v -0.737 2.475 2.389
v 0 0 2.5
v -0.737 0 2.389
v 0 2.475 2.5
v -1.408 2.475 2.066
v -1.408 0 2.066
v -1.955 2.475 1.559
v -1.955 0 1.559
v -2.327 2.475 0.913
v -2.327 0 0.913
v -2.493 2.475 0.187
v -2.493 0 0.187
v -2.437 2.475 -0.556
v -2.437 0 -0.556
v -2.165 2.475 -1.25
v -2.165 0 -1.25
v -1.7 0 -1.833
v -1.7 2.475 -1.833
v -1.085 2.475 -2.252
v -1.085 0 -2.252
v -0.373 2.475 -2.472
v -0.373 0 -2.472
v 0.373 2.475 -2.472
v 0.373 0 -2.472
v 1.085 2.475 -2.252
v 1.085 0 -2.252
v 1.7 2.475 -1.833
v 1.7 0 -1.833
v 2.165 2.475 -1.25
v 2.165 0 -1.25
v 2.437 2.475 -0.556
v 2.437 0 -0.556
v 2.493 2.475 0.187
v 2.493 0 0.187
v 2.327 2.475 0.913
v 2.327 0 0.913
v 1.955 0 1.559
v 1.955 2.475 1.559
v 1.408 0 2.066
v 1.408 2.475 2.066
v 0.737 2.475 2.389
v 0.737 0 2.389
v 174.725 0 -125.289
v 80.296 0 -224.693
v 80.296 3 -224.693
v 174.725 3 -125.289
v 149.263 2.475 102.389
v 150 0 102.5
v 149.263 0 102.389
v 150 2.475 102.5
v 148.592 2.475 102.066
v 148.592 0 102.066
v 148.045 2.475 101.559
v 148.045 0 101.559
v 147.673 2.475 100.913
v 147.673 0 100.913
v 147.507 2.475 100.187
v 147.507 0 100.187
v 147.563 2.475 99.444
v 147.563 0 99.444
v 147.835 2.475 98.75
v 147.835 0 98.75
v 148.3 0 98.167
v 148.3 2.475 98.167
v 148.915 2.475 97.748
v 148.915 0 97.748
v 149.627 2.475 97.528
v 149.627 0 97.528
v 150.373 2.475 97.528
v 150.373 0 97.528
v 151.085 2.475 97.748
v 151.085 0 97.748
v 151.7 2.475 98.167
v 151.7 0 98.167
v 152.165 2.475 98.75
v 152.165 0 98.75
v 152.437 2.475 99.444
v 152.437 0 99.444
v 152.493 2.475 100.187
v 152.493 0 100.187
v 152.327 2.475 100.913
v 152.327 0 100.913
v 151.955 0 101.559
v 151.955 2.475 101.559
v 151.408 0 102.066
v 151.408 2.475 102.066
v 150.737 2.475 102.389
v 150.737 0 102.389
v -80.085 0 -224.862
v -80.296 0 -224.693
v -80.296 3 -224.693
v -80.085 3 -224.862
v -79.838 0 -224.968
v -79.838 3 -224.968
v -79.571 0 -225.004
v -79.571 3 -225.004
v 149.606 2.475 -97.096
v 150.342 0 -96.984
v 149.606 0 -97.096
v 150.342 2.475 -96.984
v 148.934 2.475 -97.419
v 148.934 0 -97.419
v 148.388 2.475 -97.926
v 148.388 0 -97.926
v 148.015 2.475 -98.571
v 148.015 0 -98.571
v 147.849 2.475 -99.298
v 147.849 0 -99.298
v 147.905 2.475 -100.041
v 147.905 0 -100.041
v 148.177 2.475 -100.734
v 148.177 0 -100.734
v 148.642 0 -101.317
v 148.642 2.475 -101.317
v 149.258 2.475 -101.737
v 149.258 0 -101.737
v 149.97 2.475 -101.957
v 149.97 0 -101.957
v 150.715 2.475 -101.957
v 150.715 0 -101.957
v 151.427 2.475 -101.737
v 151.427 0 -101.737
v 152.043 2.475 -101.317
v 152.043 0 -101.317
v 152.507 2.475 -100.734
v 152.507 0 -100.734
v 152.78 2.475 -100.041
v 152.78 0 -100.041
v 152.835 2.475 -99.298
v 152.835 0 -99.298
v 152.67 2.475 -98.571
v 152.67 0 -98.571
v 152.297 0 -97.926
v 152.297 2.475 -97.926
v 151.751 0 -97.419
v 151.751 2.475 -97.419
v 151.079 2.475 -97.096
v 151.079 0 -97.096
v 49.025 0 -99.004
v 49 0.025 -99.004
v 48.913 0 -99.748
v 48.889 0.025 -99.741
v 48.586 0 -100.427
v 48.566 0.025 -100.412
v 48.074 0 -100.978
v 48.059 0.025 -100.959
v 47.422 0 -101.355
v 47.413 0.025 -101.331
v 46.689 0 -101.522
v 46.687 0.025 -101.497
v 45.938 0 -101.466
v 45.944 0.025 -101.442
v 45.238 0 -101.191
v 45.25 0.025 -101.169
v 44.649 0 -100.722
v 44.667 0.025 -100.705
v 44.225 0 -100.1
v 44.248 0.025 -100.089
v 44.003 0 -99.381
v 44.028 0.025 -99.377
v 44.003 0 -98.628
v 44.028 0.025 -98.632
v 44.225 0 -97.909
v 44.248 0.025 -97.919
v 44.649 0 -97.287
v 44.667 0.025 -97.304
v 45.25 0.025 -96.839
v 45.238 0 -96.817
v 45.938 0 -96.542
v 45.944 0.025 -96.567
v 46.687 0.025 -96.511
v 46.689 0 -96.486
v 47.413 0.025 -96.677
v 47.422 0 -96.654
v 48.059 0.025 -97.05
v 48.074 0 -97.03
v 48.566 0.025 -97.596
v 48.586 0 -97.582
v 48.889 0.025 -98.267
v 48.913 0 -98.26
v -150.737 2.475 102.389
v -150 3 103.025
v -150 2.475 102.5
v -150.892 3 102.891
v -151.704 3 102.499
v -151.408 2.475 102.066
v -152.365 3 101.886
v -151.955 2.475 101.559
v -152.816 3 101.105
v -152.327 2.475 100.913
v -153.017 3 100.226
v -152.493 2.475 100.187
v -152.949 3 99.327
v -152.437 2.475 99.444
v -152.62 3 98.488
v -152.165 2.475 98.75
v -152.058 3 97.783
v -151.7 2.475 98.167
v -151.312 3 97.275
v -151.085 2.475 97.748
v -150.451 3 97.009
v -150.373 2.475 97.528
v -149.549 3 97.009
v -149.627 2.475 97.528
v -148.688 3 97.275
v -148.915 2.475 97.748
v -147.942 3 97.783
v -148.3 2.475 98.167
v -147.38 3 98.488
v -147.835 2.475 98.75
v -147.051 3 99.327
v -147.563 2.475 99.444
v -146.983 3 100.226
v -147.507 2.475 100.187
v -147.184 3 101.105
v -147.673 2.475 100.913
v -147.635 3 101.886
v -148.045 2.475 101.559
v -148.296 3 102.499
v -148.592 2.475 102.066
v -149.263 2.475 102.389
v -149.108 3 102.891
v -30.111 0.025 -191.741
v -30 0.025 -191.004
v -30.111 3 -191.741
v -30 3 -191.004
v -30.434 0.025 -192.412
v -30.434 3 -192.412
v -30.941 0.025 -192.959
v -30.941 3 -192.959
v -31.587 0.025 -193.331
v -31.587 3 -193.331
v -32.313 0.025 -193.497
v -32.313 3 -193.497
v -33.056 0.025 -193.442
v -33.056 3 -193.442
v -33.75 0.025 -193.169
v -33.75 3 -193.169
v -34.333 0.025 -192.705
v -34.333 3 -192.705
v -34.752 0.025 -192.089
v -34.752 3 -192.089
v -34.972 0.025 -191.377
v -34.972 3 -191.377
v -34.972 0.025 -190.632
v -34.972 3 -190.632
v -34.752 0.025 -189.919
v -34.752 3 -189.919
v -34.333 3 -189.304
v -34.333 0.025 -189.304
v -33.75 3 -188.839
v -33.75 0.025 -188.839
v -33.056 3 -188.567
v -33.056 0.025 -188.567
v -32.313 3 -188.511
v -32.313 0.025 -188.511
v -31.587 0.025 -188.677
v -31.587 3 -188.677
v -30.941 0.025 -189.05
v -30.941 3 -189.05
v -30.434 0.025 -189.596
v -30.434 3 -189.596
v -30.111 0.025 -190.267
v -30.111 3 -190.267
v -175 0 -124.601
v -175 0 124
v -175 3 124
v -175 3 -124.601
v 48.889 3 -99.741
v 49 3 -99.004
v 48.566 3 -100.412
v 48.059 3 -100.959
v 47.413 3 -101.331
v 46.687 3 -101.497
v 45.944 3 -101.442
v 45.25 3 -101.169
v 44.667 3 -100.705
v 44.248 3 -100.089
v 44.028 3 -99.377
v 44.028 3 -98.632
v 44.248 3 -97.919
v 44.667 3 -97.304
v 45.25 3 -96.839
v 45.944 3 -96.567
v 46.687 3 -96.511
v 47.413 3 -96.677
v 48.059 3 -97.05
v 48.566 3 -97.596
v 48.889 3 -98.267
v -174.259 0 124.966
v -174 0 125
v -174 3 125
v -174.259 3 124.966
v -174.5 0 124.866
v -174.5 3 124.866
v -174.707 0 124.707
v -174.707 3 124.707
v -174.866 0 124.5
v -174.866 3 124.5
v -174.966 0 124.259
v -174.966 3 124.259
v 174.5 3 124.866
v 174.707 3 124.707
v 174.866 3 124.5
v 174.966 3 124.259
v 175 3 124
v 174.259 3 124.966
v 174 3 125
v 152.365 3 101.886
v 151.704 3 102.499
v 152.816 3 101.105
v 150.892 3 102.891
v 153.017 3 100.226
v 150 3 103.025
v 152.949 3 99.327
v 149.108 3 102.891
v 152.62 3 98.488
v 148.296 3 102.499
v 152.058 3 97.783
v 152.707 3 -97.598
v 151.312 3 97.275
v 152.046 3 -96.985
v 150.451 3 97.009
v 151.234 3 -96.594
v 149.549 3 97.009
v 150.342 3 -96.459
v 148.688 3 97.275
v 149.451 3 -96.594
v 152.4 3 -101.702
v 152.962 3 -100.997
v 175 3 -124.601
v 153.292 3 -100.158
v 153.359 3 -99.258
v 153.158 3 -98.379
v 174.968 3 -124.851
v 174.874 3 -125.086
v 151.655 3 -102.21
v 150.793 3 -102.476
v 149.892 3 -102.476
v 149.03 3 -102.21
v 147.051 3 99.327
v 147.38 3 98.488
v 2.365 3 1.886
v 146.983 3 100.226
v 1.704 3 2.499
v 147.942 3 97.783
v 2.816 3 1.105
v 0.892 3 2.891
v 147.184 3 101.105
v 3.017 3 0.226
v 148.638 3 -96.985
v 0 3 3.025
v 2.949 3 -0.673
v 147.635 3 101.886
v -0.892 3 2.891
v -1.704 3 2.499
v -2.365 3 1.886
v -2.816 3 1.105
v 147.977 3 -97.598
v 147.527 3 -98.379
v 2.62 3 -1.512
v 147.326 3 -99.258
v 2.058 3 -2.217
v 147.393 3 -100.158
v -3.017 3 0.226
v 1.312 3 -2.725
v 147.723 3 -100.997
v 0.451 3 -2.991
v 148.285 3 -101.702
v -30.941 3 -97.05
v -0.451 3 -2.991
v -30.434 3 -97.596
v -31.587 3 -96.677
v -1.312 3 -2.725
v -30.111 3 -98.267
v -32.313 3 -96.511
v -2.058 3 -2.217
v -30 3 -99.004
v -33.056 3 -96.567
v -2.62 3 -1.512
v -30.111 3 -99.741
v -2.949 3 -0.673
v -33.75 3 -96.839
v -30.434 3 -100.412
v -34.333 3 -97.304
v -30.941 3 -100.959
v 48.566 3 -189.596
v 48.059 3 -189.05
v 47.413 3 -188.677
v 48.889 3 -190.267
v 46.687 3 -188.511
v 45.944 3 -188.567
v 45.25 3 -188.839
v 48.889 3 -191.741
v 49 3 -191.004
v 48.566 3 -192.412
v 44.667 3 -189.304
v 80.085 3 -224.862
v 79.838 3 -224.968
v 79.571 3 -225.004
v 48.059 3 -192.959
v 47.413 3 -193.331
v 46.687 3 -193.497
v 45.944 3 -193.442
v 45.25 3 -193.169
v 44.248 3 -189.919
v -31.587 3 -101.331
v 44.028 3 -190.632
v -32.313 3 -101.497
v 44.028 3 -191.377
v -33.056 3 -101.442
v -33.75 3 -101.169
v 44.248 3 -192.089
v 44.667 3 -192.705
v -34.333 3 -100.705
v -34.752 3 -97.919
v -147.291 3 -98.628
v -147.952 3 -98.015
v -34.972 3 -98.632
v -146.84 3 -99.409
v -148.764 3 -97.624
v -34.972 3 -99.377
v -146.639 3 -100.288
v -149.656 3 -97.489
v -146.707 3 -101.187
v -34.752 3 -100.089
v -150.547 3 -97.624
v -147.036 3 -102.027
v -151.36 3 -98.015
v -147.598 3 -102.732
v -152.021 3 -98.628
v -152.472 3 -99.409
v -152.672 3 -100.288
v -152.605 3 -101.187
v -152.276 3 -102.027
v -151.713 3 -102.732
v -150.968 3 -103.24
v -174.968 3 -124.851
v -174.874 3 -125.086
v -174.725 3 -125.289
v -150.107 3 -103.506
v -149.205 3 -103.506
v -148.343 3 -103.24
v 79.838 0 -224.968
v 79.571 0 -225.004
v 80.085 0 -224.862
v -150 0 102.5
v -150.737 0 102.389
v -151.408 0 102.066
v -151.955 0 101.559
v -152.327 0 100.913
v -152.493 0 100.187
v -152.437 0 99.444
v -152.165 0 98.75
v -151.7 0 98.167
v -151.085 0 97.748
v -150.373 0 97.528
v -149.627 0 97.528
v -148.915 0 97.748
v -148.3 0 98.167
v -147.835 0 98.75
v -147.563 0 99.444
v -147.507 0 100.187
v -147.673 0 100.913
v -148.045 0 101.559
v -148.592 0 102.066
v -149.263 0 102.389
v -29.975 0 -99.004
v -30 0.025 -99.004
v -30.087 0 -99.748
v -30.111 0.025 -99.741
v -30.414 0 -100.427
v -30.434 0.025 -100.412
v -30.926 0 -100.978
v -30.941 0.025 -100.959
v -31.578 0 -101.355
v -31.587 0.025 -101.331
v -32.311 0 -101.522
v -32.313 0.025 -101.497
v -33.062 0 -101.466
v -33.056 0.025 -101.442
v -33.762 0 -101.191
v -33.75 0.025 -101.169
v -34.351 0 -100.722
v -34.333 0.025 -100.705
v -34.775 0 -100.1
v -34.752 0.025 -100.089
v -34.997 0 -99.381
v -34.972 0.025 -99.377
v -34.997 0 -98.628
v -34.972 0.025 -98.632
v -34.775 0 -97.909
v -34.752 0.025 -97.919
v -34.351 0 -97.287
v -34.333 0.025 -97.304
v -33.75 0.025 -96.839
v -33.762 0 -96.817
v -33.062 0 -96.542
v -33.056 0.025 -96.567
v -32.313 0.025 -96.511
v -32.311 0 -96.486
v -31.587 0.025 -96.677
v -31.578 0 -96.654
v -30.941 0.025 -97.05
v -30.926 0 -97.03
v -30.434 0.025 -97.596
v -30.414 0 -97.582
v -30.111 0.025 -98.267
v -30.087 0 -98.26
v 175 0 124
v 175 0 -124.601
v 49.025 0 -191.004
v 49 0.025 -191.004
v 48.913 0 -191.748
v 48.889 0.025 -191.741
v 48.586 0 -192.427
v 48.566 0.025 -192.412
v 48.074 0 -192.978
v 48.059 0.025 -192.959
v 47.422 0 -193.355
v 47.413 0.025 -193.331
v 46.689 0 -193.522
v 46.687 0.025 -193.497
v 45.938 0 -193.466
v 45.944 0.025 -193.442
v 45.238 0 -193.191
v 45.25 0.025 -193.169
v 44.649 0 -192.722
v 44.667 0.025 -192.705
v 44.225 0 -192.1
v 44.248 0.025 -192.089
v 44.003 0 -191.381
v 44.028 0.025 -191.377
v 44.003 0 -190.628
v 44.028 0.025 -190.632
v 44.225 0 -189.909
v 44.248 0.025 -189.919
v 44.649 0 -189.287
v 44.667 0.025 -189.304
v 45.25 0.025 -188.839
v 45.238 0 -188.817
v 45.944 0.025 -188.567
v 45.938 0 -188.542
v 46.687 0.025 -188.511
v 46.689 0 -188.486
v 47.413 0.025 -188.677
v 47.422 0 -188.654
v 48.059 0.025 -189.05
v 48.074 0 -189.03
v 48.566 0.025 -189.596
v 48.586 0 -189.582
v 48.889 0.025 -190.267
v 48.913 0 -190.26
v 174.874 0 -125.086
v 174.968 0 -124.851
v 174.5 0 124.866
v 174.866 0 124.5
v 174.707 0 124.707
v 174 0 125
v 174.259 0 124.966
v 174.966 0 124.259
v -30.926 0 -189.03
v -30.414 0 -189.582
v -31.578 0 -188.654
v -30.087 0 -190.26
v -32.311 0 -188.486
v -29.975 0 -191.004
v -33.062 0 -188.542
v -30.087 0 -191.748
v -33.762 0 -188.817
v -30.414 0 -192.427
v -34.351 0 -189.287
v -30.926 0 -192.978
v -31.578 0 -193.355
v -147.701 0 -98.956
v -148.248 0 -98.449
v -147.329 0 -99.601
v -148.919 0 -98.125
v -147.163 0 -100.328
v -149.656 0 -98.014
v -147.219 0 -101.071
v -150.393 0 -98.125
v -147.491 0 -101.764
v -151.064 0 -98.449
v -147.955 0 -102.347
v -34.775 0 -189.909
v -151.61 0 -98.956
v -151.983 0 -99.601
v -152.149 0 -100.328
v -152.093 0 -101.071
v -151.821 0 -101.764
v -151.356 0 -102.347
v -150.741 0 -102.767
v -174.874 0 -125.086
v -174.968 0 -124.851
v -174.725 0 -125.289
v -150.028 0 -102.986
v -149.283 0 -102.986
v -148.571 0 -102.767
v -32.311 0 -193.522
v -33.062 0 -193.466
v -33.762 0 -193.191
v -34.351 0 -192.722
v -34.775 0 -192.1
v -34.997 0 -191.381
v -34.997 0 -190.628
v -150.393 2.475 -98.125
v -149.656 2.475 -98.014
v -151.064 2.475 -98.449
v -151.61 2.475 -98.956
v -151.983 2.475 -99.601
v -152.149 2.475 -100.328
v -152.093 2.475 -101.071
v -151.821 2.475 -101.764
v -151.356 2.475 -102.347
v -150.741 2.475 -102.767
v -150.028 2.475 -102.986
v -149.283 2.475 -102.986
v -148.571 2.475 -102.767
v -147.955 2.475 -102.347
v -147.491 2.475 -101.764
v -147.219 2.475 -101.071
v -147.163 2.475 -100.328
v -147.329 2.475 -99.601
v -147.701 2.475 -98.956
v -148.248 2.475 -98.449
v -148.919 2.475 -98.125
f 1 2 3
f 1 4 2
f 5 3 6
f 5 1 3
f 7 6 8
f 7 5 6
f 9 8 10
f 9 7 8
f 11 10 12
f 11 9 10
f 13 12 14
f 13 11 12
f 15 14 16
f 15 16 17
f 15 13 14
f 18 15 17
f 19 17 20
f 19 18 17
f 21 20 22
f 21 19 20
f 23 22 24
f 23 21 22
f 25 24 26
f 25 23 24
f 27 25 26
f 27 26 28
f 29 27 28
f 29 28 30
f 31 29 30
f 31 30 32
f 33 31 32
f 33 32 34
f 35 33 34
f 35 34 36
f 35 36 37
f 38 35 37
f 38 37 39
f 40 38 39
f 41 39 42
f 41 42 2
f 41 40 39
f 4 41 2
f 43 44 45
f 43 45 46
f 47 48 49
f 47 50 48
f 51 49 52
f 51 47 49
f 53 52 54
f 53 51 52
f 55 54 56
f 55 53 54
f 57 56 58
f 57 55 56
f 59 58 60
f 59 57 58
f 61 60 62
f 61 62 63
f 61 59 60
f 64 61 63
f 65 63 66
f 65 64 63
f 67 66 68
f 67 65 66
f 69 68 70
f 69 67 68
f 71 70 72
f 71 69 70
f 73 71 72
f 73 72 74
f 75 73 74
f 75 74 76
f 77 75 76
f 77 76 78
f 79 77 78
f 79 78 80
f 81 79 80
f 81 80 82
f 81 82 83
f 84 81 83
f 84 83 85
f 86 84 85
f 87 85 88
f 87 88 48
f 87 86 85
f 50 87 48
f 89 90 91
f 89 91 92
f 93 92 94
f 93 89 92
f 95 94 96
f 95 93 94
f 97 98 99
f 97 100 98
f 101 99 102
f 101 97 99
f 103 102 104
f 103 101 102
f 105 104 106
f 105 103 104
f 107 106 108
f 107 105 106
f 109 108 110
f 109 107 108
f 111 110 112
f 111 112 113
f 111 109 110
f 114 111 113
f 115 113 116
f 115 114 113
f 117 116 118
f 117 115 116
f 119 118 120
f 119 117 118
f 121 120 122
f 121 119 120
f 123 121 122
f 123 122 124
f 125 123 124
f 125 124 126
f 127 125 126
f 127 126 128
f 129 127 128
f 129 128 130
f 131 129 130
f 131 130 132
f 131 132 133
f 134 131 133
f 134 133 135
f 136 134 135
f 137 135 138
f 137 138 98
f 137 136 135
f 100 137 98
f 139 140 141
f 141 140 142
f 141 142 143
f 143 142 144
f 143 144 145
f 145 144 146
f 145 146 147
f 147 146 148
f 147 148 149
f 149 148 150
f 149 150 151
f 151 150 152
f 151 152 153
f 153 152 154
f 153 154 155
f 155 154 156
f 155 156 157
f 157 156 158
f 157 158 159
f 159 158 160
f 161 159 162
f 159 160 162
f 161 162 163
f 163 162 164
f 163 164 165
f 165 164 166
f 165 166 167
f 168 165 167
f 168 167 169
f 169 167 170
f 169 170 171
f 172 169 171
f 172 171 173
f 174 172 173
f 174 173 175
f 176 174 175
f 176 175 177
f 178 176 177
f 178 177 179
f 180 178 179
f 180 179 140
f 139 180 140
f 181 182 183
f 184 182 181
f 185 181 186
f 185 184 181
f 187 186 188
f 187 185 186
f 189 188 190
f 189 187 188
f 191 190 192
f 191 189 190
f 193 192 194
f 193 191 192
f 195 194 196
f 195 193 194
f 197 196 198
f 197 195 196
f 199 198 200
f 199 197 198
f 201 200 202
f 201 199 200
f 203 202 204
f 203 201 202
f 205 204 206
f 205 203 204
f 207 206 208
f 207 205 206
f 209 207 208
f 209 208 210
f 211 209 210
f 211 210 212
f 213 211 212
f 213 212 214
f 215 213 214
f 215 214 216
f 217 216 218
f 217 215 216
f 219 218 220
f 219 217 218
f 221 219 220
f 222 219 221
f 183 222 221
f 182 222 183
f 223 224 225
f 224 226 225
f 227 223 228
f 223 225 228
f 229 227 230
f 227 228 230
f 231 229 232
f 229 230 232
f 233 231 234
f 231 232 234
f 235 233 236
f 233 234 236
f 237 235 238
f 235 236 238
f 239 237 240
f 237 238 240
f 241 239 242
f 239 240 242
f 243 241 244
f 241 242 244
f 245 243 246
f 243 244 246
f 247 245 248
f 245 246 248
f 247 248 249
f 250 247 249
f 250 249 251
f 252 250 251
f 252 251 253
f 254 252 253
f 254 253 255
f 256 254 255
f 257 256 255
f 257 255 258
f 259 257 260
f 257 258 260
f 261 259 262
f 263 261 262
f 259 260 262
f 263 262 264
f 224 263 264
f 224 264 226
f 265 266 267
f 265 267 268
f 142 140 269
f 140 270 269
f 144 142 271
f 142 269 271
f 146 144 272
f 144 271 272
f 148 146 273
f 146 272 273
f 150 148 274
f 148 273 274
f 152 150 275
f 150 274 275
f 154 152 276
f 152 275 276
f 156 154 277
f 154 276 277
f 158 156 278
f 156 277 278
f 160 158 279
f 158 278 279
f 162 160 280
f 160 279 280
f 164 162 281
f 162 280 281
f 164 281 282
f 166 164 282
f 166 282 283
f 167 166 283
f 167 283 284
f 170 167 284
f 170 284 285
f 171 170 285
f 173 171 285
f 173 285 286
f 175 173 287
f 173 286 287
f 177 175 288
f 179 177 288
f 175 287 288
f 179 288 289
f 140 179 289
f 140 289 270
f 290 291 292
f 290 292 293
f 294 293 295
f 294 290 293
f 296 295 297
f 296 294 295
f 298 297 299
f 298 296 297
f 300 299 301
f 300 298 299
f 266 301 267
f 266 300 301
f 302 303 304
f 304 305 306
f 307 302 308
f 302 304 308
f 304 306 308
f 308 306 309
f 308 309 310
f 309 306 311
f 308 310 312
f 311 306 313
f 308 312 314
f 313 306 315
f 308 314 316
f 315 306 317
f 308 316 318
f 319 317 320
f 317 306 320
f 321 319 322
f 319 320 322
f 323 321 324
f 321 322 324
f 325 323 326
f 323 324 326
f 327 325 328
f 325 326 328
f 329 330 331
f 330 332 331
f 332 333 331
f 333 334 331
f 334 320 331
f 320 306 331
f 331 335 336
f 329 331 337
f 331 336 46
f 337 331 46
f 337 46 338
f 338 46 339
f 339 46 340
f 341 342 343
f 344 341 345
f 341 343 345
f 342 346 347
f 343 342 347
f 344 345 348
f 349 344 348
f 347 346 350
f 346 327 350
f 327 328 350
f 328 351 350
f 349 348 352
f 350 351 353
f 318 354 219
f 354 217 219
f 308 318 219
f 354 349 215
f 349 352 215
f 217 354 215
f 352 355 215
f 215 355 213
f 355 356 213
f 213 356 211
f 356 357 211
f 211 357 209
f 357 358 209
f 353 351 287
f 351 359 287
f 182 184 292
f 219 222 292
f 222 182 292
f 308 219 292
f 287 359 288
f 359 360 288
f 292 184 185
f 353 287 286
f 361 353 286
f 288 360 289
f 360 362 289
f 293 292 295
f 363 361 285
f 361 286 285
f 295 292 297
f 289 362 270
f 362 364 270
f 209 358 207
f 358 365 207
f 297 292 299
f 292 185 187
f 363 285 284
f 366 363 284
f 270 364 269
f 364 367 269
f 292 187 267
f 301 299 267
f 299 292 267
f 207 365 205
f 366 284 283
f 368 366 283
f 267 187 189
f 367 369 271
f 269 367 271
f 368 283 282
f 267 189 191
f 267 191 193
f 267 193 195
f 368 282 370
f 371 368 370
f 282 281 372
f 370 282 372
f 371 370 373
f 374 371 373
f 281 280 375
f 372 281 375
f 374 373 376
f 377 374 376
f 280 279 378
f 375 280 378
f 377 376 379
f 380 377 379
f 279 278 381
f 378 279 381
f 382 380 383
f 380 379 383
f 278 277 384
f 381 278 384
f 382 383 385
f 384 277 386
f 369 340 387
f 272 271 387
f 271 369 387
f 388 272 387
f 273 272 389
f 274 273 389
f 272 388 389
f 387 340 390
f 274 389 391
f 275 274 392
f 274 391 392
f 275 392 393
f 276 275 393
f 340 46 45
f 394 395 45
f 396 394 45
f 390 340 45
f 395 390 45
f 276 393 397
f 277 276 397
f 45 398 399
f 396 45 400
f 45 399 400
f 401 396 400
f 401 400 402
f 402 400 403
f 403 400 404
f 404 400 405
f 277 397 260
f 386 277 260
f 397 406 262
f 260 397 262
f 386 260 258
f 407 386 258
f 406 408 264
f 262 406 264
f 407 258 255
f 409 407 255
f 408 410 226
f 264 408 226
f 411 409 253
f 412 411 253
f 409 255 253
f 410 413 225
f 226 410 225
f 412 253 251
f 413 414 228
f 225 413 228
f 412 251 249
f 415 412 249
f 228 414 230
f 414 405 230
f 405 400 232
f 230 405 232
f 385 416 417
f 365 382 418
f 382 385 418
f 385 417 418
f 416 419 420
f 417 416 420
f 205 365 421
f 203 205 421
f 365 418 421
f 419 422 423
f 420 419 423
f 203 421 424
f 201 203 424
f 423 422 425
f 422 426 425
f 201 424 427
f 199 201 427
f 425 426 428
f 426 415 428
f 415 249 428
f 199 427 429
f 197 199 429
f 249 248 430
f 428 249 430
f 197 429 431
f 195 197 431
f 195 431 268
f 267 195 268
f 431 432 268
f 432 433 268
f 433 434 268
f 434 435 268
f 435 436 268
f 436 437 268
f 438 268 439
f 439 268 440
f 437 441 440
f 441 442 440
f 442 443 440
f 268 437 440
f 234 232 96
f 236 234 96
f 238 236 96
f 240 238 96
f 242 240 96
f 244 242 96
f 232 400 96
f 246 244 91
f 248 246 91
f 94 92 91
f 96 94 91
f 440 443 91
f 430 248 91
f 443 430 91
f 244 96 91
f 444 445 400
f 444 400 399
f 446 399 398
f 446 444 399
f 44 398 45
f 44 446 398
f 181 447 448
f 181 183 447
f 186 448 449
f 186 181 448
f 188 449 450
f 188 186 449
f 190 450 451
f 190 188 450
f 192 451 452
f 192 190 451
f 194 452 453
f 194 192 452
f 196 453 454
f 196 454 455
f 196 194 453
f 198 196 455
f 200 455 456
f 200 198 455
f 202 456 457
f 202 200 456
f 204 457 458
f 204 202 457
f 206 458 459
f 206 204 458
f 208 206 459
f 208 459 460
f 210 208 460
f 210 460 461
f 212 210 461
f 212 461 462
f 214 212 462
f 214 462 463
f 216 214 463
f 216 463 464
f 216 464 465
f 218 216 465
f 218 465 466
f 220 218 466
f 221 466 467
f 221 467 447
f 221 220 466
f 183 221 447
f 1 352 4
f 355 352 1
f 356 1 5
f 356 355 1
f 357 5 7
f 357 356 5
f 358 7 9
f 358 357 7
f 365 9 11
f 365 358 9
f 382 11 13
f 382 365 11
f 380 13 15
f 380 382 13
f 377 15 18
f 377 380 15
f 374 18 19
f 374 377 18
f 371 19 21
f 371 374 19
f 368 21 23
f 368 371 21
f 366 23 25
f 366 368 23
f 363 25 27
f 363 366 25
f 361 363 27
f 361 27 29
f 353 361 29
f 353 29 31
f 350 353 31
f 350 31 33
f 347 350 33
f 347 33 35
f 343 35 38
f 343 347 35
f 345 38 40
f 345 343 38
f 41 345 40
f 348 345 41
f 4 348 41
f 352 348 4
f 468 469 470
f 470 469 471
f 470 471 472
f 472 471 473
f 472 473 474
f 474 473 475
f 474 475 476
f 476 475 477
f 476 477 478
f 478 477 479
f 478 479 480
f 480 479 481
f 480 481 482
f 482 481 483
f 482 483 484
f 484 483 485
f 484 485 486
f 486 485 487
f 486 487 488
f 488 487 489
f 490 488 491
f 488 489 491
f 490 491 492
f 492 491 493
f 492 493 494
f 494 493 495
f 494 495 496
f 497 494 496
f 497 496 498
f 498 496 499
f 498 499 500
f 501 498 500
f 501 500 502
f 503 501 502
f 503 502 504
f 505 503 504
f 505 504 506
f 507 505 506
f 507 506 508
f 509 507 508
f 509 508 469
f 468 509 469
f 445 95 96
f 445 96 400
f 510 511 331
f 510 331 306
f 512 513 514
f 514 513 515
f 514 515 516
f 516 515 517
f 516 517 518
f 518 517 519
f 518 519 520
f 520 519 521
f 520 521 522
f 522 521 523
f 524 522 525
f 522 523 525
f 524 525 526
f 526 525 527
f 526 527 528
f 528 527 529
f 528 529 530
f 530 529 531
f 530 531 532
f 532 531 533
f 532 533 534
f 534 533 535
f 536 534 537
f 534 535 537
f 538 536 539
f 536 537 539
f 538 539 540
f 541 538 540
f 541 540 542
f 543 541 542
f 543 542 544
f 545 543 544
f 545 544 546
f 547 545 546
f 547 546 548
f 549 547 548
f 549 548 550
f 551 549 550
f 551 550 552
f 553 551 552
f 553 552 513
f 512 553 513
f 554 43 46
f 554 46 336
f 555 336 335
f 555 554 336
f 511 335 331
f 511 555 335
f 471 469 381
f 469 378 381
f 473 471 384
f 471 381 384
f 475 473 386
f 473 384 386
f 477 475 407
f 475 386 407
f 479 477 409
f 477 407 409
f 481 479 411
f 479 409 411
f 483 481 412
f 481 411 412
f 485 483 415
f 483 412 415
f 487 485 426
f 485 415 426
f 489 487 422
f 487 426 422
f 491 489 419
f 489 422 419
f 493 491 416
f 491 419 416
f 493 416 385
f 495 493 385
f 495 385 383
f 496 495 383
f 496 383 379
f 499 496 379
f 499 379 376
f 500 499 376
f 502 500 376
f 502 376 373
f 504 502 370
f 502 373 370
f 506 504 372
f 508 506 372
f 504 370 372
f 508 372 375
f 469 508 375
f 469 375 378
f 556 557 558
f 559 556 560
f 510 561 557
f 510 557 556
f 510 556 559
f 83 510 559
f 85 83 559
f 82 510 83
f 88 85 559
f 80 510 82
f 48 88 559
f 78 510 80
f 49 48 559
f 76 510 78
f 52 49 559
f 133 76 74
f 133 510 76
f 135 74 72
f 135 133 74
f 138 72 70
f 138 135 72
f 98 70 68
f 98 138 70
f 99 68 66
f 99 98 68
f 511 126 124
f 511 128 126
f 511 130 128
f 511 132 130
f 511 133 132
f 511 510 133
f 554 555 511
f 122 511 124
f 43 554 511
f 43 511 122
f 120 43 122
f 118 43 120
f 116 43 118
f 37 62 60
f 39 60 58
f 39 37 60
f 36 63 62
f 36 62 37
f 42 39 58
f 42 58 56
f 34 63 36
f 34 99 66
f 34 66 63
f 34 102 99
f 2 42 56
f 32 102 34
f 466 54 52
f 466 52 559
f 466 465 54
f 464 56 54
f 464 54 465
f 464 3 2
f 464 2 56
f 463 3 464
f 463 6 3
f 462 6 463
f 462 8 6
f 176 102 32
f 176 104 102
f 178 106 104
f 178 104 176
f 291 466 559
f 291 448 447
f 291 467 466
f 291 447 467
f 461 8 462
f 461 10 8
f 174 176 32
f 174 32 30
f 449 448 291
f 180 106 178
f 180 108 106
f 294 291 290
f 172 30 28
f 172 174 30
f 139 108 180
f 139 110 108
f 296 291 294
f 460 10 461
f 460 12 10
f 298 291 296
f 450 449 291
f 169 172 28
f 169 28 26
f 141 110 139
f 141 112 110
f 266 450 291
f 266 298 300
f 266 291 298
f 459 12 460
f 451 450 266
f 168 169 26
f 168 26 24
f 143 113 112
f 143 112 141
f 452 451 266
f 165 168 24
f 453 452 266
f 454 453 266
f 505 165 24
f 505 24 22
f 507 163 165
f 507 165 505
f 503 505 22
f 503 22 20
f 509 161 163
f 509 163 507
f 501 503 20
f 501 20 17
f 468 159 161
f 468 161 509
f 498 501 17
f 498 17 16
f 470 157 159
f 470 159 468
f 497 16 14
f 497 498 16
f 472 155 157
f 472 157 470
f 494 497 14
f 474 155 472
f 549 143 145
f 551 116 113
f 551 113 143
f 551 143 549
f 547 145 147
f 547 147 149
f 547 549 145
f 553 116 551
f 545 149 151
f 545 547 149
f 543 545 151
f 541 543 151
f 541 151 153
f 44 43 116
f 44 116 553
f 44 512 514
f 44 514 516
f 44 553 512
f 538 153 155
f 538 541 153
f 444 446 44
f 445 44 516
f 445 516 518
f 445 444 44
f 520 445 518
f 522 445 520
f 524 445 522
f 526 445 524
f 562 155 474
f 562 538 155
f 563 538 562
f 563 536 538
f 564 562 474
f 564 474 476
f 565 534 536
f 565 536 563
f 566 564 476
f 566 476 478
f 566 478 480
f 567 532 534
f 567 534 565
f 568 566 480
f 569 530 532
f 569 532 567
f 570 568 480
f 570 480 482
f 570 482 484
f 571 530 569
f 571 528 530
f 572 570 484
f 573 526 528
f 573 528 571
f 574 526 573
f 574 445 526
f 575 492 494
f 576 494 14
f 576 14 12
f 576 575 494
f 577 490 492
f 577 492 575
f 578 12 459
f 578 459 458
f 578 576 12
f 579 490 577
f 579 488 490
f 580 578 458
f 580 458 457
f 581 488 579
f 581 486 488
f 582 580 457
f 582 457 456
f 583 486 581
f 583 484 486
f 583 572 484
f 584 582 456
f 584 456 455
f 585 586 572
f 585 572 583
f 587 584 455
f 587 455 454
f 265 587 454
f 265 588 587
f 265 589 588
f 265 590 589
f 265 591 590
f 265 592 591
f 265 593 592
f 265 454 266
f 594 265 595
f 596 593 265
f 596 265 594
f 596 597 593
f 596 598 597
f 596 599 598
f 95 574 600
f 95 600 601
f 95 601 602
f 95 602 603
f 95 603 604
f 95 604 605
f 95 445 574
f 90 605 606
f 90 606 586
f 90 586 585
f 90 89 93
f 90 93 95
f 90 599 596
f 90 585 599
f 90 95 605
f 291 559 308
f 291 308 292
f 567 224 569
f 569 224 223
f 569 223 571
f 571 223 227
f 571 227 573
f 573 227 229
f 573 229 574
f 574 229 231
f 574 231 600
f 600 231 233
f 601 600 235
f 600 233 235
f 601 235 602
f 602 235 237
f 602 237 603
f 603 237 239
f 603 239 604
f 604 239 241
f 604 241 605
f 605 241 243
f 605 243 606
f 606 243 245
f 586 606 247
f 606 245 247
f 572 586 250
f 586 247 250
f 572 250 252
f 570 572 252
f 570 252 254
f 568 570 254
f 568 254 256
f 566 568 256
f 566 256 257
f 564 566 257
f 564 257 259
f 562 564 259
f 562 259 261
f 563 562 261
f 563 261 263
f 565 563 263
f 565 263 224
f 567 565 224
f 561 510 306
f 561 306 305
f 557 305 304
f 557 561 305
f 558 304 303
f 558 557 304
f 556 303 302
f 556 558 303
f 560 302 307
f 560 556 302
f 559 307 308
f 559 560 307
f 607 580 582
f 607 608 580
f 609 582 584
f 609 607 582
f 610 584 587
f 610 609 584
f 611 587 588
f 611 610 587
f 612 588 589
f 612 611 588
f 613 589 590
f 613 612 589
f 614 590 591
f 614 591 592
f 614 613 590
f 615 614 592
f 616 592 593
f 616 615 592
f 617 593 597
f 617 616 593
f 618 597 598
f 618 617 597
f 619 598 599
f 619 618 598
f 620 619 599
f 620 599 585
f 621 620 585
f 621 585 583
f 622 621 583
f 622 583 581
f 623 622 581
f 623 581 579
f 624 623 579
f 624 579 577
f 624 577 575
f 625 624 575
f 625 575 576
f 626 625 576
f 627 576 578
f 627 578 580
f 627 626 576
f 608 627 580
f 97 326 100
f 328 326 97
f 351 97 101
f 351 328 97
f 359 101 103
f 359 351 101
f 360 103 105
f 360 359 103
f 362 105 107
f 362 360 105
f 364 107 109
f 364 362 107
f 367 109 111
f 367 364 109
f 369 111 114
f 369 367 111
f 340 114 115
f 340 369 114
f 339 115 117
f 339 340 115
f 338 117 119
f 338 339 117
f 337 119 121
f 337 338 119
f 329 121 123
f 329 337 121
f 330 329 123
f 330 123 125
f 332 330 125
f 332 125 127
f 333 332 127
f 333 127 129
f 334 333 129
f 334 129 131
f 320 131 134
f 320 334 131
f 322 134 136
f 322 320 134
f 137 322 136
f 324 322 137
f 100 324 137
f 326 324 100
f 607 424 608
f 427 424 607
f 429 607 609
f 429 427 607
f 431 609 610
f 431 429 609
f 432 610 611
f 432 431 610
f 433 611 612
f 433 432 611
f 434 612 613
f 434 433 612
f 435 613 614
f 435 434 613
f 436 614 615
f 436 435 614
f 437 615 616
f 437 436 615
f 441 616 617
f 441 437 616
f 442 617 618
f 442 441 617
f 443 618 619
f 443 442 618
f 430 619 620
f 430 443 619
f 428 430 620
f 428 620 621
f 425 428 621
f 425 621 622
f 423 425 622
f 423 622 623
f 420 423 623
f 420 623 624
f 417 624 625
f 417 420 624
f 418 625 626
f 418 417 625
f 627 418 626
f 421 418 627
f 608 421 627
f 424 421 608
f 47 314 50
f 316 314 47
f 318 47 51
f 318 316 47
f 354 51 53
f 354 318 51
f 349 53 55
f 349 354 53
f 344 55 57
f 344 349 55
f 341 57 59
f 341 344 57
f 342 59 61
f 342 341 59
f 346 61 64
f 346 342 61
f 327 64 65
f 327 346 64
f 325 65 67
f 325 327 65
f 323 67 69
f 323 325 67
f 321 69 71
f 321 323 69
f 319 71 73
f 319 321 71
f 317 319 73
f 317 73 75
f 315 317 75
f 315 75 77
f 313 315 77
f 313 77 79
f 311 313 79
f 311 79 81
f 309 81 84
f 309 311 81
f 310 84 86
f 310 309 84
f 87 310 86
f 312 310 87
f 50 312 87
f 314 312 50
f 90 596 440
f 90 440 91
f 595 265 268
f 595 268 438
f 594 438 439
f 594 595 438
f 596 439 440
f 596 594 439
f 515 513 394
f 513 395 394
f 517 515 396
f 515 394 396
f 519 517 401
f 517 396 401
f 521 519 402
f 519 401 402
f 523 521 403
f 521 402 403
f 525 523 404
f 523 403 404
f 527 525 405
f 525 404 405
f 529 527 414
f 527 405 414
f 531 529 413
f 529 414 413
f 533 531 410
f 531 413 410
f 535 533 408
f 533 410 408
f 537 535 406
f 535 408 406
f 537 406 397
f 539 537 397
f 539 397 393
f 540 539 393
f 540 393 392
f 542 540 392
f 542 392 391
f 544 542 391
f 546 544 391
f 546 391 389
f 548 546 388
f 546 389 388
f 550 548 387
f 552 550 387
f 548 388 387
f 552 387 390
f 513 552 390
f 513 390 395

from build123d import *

# Parameters (mm, degrees)
PLATE_EXTRUDE_1_DEPTH             = 3
M6_TAPPED_HOLE2_AT_2_COUNT        = 2
M6_TAPPED_HOLE2_AT_2_PITCH        = 300
M6_TAPPED_HOLE2_AT_3_COUNT        = 2
M6_TAPPED_HOLE2_AT_3_PITCH        = 180.277563773
M6_TAPPED_HOLE2_AT_4_COUNT        = 2
M6_TAPPED_HOLE2_AT_4_PITCH        = 200.51462203
M6_TAPPED_HOLE2_AT_5_COUNT        = 2
M6_TAPPED_HOLE2_AT_5_PITCH        = 360.55459645
TAP_DRILL_FOR_M6_TAP1_D           = 5
TAP_DRILL_FOR_M6_TAP1_DEPTH       = 10
TAP_DRILL_FOR_M6_TAP1_CSINK_D     = 5.05
TAP_DRILL_FOR_M6_TAP1_CSINK_ANGLE = 90
TAP_DRILL_FOR_M6_TAP1_TIP         = 1.502151548


with BuildPart() as part:
    # Plate Template → Plate Extrude 1 (new body)
    with BuildSketch(Plane(origin=(0, 0, 0), x_dir=(1, 0, 0), z_dir=(0, 1, 0))):
        with BuildLine():
            Line((-79.570676183, 225.004191897), (79.570676183, 225.004191897))
            ThreePointArc((79.570676183, 225.004191897), (79.965179487, 224.92308642), (80.295690033, 224.692926184))
            Line((80.295690033, 224.692926184), (174.72501385, 125.289471239))
            ThreePointArc((174.72501385, 125.289471239), (174.928712509, 124.971537539), (175, 124.600736953))
            Line((175, 124.600736953), (175, -124))
            ThreePointArc((175, -124), (174.707106781, -124.707106781), (174, -125))
            Line((174, -125), (-174, -125))
            ThreePointArc((-174, -125), (-174.707106781, -124.707106781), (-175, -124))
            Line((-175, -124), (-175, 124.600736953))
            ThreePointArc((-175, 124.600736953), (-174.928712509, 124.971537539), (-174.72501385, 125.289471239))
            Line((-174.72501385, 125.289471239), (-80.295690033, 224.692926184))
            ThreePointArc((-80.295690033, 224.692926184), (-79.965179487, 224.92308642), (-79.570676183, 225.004191897))
        make_face()
    extrude(amount=PLATE_EXTRUDE_1_DEPTH)

    # Sketch3 → M6 Tapped Hole2 (revolve, cut)
    with BuildSketch(Plane(origin=(-150, 3, 100), x_dir=(0, 0, 1), z_dir=(1, 0, 0))):
        Polygon((0, 0), (0, 3), (2.5, 3), (2.5, 0.525), (3.025, 0), align=None)
    m6_tapped_hole2 = revolve(axis=Axis((-150, 9.35, 100), (0, -1, 0)), mode=Mode.SUBTRACT)

    # M6 Tapped Hole2 at 2: M6 Tapped Hole2 ×2
    with Locations(*[(i * M6_TAPPED_HOLE2_AT_2_PITCH, 0, 0) for i in range(1, M6_TAPPED_HOLE2_AT_2_COUNT)]):
        add(m6_tapped_hole2, mode=Mode.SUBTRACT)

    # M6 Tapped Hole2 at 3: M6 Tapped Hole2 ×2
    with Locations(*[Vector(0.8320502943378437, 0, -0.554700196225229) * (i * M6_TAPPED_HOLE2_AT_3_PITCH) for i in range(1, M6_TAPPED_HOLE2_AT_3_COUNT)]):
        add(m6_tapped_hole2, mode=Mode.SUBTRACT)

    # M6 Tapped Hole2 at 4: M6 Tapped Hole2 ×2
    with Locations(*[Vector(0.0017163887650713508, 0, -0.9999985270037187) * (i * M6_TAPPED_HOLE2_AT_4_PITCH) for i in range(1, M6_TAPPED_HOLE2_AT_4_COUNT)]):
        add(m6_tapped_hole2, mode=Mode.SUBTRACT)

    # M6 Tapped Hole2 at 5: M6 Tapped Hole2 ×2
    with Locations(*[Vector(0.8330011499156382, 0, -0.5532712573767269) * (i * M6_TAPPED_HOLE2_AT_5_PITCH) for i in range(1, M6_TAPPED_HOLE2_AT_5_COUNT)]):
        add(m6_tapped_hole2, mode=Mode.SUBTRACT)

    # Tap Drill for M6 Tap1
    with Locations(Plane(origin=(0, 0, 0), x_dir=(-1, 0, 0), z_dir=(0, -1, 0))):
        with Locations((-46.5, 191.004191906), (32.5, 191.004191906), (32.5, 99.004191897), (-46.5, 99.004191897)):
            CounterSinkHole(TAP_DRILL_FOR_M6_TAP1_D / 2, TAP_DRILL_FOR_M6_TAP1_CSINK_D / 2, depth=TAP_DRILL_FOR_M6_TAP1_DEPTH, counter_sink_angle=TAP_DRILL_FOR_M6_TAP1_CSINK_ANGLE)
            with Locations((0, 0, -(TAP_DRILL_FOR_M6_TAP1_DEPTH + TAP_DRILL_FOR_M6_TAP1_TIP / 2))):  # 118° drill point
                Cone(0, TAP_DRILL_FOR_M6_TAP1_D / 2, TAP_DRILL_FOR_M6_TAP1_TIP, mode=Mode.SUBTRACT)


solid = part.part
